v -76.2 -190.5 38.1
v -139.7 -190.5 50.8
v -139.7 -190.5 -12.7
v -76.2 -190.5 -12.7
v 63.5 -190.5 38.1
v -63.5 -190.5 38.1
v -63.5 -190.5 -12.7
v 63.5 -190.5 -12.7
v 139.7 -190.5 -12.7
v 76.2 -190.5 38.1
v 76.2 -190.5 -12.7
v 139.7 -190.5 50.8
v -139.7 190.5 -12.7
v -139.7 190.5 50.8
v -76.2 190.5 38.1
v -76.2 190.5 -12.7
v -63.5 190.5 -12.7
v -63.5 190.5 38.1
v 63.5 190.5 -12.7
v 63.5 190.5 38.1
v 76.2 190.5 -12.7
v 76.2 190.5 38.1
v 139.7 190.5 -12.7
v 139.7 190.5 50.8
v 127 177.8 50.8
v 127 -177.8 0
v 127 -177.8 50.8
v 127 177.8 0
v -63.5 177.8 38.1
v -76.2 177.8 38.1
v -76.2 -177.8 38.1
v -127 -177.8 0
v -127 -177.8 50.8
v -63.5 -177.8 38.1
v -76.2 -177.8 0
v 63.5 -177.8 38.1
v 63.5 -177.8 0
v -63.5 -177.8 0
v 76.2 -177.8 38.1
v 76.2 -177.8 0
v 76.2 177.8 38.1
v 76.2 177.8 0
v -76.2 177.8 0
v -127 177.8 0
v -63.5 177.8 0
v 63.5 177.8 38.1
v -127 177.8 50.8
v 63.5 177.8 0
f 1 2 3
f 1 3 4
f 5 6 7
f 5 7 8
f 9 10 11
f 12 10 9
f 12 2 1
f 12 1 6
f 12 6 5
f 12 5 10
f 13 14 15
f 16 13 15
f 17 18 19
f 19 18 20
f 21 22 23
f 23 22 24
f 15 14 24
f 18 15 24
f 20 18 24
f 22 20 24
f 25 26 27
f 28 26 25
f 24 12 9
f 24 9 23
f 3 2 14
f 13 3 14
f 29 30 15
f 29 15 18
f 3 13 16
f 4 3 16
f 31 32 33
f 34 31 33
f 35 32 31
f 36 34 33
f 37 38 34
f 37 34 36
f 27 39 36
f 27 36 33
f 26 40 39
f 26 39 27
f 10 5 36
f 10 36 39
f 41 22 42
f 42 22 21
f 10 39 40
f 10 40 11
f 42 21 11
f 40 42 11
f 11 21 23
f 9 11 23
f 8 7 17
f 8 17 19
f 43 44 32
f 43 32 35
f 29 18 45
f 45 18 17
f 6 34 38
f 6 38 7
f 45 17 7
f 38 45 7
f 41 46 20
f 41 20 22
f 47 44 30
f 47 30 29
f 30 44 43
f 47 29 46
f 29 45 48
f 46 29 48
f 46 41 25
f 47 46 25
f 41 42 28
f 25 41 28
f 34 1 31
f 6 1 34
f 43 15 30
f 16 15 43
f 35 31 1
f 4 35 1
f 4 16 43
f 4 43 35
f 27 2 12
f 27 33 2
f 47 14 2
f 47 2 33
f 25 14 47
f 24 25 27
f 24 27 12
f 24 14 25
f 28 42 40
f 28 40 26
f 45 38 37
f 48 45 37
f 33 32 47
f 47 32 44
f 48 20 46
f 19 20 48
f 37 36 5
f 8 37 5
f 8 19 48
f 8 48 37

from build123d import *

# Parameters (mm, degrees)
F0_W     = 279.4
F0_H     = 381
F0_W_2   = 254
F0_H_2   = 355.6
F1_DEPTH = 50.8
F2_DEPTH = 12.7
F3_W     = 12.7
F3_H     = 381
F4_DEPTH = 50.8


with BuildPart() as f1:
    # F0 (on Top) → F1 (new body)
    with BuildSketch(Plane.XY):
        Rectangle(F0_W, F0_H)
        Rectangle(F0_W_2, F0_H_2, mode=Mode.SUBTRACT)
    extrude(amount=F1_DEPTH)

    # F0 (on Top) → F2 (join)
    with BuildSketch(Plane.XY):
        Rectangle(F0_W, F0_H)
        Rectangle(F0_W_2, F0_H_2, mode=Mode.SUBTRACT)
        Rectangle(F0_W_2, F0_H_2)
    extrude(amount=-F2_DEPTH)

    # F3 (on face) → F4 (cut)
    with BuildSketch(Plane(origin=(0, 0, -12.7), x_dir=(1, 0, 0), z_dir=(0, 0, -1))):
        with Locations((-69.85, 0)):
            Rectangle(F3_W, F3_H)
        with Locations((69.85, 0)):
            Rectangle(F3_W, F3_H)
    extrude(amount=-F4_DEPTH, mode=Mode.SUBTRACT)


solid = f1.part
